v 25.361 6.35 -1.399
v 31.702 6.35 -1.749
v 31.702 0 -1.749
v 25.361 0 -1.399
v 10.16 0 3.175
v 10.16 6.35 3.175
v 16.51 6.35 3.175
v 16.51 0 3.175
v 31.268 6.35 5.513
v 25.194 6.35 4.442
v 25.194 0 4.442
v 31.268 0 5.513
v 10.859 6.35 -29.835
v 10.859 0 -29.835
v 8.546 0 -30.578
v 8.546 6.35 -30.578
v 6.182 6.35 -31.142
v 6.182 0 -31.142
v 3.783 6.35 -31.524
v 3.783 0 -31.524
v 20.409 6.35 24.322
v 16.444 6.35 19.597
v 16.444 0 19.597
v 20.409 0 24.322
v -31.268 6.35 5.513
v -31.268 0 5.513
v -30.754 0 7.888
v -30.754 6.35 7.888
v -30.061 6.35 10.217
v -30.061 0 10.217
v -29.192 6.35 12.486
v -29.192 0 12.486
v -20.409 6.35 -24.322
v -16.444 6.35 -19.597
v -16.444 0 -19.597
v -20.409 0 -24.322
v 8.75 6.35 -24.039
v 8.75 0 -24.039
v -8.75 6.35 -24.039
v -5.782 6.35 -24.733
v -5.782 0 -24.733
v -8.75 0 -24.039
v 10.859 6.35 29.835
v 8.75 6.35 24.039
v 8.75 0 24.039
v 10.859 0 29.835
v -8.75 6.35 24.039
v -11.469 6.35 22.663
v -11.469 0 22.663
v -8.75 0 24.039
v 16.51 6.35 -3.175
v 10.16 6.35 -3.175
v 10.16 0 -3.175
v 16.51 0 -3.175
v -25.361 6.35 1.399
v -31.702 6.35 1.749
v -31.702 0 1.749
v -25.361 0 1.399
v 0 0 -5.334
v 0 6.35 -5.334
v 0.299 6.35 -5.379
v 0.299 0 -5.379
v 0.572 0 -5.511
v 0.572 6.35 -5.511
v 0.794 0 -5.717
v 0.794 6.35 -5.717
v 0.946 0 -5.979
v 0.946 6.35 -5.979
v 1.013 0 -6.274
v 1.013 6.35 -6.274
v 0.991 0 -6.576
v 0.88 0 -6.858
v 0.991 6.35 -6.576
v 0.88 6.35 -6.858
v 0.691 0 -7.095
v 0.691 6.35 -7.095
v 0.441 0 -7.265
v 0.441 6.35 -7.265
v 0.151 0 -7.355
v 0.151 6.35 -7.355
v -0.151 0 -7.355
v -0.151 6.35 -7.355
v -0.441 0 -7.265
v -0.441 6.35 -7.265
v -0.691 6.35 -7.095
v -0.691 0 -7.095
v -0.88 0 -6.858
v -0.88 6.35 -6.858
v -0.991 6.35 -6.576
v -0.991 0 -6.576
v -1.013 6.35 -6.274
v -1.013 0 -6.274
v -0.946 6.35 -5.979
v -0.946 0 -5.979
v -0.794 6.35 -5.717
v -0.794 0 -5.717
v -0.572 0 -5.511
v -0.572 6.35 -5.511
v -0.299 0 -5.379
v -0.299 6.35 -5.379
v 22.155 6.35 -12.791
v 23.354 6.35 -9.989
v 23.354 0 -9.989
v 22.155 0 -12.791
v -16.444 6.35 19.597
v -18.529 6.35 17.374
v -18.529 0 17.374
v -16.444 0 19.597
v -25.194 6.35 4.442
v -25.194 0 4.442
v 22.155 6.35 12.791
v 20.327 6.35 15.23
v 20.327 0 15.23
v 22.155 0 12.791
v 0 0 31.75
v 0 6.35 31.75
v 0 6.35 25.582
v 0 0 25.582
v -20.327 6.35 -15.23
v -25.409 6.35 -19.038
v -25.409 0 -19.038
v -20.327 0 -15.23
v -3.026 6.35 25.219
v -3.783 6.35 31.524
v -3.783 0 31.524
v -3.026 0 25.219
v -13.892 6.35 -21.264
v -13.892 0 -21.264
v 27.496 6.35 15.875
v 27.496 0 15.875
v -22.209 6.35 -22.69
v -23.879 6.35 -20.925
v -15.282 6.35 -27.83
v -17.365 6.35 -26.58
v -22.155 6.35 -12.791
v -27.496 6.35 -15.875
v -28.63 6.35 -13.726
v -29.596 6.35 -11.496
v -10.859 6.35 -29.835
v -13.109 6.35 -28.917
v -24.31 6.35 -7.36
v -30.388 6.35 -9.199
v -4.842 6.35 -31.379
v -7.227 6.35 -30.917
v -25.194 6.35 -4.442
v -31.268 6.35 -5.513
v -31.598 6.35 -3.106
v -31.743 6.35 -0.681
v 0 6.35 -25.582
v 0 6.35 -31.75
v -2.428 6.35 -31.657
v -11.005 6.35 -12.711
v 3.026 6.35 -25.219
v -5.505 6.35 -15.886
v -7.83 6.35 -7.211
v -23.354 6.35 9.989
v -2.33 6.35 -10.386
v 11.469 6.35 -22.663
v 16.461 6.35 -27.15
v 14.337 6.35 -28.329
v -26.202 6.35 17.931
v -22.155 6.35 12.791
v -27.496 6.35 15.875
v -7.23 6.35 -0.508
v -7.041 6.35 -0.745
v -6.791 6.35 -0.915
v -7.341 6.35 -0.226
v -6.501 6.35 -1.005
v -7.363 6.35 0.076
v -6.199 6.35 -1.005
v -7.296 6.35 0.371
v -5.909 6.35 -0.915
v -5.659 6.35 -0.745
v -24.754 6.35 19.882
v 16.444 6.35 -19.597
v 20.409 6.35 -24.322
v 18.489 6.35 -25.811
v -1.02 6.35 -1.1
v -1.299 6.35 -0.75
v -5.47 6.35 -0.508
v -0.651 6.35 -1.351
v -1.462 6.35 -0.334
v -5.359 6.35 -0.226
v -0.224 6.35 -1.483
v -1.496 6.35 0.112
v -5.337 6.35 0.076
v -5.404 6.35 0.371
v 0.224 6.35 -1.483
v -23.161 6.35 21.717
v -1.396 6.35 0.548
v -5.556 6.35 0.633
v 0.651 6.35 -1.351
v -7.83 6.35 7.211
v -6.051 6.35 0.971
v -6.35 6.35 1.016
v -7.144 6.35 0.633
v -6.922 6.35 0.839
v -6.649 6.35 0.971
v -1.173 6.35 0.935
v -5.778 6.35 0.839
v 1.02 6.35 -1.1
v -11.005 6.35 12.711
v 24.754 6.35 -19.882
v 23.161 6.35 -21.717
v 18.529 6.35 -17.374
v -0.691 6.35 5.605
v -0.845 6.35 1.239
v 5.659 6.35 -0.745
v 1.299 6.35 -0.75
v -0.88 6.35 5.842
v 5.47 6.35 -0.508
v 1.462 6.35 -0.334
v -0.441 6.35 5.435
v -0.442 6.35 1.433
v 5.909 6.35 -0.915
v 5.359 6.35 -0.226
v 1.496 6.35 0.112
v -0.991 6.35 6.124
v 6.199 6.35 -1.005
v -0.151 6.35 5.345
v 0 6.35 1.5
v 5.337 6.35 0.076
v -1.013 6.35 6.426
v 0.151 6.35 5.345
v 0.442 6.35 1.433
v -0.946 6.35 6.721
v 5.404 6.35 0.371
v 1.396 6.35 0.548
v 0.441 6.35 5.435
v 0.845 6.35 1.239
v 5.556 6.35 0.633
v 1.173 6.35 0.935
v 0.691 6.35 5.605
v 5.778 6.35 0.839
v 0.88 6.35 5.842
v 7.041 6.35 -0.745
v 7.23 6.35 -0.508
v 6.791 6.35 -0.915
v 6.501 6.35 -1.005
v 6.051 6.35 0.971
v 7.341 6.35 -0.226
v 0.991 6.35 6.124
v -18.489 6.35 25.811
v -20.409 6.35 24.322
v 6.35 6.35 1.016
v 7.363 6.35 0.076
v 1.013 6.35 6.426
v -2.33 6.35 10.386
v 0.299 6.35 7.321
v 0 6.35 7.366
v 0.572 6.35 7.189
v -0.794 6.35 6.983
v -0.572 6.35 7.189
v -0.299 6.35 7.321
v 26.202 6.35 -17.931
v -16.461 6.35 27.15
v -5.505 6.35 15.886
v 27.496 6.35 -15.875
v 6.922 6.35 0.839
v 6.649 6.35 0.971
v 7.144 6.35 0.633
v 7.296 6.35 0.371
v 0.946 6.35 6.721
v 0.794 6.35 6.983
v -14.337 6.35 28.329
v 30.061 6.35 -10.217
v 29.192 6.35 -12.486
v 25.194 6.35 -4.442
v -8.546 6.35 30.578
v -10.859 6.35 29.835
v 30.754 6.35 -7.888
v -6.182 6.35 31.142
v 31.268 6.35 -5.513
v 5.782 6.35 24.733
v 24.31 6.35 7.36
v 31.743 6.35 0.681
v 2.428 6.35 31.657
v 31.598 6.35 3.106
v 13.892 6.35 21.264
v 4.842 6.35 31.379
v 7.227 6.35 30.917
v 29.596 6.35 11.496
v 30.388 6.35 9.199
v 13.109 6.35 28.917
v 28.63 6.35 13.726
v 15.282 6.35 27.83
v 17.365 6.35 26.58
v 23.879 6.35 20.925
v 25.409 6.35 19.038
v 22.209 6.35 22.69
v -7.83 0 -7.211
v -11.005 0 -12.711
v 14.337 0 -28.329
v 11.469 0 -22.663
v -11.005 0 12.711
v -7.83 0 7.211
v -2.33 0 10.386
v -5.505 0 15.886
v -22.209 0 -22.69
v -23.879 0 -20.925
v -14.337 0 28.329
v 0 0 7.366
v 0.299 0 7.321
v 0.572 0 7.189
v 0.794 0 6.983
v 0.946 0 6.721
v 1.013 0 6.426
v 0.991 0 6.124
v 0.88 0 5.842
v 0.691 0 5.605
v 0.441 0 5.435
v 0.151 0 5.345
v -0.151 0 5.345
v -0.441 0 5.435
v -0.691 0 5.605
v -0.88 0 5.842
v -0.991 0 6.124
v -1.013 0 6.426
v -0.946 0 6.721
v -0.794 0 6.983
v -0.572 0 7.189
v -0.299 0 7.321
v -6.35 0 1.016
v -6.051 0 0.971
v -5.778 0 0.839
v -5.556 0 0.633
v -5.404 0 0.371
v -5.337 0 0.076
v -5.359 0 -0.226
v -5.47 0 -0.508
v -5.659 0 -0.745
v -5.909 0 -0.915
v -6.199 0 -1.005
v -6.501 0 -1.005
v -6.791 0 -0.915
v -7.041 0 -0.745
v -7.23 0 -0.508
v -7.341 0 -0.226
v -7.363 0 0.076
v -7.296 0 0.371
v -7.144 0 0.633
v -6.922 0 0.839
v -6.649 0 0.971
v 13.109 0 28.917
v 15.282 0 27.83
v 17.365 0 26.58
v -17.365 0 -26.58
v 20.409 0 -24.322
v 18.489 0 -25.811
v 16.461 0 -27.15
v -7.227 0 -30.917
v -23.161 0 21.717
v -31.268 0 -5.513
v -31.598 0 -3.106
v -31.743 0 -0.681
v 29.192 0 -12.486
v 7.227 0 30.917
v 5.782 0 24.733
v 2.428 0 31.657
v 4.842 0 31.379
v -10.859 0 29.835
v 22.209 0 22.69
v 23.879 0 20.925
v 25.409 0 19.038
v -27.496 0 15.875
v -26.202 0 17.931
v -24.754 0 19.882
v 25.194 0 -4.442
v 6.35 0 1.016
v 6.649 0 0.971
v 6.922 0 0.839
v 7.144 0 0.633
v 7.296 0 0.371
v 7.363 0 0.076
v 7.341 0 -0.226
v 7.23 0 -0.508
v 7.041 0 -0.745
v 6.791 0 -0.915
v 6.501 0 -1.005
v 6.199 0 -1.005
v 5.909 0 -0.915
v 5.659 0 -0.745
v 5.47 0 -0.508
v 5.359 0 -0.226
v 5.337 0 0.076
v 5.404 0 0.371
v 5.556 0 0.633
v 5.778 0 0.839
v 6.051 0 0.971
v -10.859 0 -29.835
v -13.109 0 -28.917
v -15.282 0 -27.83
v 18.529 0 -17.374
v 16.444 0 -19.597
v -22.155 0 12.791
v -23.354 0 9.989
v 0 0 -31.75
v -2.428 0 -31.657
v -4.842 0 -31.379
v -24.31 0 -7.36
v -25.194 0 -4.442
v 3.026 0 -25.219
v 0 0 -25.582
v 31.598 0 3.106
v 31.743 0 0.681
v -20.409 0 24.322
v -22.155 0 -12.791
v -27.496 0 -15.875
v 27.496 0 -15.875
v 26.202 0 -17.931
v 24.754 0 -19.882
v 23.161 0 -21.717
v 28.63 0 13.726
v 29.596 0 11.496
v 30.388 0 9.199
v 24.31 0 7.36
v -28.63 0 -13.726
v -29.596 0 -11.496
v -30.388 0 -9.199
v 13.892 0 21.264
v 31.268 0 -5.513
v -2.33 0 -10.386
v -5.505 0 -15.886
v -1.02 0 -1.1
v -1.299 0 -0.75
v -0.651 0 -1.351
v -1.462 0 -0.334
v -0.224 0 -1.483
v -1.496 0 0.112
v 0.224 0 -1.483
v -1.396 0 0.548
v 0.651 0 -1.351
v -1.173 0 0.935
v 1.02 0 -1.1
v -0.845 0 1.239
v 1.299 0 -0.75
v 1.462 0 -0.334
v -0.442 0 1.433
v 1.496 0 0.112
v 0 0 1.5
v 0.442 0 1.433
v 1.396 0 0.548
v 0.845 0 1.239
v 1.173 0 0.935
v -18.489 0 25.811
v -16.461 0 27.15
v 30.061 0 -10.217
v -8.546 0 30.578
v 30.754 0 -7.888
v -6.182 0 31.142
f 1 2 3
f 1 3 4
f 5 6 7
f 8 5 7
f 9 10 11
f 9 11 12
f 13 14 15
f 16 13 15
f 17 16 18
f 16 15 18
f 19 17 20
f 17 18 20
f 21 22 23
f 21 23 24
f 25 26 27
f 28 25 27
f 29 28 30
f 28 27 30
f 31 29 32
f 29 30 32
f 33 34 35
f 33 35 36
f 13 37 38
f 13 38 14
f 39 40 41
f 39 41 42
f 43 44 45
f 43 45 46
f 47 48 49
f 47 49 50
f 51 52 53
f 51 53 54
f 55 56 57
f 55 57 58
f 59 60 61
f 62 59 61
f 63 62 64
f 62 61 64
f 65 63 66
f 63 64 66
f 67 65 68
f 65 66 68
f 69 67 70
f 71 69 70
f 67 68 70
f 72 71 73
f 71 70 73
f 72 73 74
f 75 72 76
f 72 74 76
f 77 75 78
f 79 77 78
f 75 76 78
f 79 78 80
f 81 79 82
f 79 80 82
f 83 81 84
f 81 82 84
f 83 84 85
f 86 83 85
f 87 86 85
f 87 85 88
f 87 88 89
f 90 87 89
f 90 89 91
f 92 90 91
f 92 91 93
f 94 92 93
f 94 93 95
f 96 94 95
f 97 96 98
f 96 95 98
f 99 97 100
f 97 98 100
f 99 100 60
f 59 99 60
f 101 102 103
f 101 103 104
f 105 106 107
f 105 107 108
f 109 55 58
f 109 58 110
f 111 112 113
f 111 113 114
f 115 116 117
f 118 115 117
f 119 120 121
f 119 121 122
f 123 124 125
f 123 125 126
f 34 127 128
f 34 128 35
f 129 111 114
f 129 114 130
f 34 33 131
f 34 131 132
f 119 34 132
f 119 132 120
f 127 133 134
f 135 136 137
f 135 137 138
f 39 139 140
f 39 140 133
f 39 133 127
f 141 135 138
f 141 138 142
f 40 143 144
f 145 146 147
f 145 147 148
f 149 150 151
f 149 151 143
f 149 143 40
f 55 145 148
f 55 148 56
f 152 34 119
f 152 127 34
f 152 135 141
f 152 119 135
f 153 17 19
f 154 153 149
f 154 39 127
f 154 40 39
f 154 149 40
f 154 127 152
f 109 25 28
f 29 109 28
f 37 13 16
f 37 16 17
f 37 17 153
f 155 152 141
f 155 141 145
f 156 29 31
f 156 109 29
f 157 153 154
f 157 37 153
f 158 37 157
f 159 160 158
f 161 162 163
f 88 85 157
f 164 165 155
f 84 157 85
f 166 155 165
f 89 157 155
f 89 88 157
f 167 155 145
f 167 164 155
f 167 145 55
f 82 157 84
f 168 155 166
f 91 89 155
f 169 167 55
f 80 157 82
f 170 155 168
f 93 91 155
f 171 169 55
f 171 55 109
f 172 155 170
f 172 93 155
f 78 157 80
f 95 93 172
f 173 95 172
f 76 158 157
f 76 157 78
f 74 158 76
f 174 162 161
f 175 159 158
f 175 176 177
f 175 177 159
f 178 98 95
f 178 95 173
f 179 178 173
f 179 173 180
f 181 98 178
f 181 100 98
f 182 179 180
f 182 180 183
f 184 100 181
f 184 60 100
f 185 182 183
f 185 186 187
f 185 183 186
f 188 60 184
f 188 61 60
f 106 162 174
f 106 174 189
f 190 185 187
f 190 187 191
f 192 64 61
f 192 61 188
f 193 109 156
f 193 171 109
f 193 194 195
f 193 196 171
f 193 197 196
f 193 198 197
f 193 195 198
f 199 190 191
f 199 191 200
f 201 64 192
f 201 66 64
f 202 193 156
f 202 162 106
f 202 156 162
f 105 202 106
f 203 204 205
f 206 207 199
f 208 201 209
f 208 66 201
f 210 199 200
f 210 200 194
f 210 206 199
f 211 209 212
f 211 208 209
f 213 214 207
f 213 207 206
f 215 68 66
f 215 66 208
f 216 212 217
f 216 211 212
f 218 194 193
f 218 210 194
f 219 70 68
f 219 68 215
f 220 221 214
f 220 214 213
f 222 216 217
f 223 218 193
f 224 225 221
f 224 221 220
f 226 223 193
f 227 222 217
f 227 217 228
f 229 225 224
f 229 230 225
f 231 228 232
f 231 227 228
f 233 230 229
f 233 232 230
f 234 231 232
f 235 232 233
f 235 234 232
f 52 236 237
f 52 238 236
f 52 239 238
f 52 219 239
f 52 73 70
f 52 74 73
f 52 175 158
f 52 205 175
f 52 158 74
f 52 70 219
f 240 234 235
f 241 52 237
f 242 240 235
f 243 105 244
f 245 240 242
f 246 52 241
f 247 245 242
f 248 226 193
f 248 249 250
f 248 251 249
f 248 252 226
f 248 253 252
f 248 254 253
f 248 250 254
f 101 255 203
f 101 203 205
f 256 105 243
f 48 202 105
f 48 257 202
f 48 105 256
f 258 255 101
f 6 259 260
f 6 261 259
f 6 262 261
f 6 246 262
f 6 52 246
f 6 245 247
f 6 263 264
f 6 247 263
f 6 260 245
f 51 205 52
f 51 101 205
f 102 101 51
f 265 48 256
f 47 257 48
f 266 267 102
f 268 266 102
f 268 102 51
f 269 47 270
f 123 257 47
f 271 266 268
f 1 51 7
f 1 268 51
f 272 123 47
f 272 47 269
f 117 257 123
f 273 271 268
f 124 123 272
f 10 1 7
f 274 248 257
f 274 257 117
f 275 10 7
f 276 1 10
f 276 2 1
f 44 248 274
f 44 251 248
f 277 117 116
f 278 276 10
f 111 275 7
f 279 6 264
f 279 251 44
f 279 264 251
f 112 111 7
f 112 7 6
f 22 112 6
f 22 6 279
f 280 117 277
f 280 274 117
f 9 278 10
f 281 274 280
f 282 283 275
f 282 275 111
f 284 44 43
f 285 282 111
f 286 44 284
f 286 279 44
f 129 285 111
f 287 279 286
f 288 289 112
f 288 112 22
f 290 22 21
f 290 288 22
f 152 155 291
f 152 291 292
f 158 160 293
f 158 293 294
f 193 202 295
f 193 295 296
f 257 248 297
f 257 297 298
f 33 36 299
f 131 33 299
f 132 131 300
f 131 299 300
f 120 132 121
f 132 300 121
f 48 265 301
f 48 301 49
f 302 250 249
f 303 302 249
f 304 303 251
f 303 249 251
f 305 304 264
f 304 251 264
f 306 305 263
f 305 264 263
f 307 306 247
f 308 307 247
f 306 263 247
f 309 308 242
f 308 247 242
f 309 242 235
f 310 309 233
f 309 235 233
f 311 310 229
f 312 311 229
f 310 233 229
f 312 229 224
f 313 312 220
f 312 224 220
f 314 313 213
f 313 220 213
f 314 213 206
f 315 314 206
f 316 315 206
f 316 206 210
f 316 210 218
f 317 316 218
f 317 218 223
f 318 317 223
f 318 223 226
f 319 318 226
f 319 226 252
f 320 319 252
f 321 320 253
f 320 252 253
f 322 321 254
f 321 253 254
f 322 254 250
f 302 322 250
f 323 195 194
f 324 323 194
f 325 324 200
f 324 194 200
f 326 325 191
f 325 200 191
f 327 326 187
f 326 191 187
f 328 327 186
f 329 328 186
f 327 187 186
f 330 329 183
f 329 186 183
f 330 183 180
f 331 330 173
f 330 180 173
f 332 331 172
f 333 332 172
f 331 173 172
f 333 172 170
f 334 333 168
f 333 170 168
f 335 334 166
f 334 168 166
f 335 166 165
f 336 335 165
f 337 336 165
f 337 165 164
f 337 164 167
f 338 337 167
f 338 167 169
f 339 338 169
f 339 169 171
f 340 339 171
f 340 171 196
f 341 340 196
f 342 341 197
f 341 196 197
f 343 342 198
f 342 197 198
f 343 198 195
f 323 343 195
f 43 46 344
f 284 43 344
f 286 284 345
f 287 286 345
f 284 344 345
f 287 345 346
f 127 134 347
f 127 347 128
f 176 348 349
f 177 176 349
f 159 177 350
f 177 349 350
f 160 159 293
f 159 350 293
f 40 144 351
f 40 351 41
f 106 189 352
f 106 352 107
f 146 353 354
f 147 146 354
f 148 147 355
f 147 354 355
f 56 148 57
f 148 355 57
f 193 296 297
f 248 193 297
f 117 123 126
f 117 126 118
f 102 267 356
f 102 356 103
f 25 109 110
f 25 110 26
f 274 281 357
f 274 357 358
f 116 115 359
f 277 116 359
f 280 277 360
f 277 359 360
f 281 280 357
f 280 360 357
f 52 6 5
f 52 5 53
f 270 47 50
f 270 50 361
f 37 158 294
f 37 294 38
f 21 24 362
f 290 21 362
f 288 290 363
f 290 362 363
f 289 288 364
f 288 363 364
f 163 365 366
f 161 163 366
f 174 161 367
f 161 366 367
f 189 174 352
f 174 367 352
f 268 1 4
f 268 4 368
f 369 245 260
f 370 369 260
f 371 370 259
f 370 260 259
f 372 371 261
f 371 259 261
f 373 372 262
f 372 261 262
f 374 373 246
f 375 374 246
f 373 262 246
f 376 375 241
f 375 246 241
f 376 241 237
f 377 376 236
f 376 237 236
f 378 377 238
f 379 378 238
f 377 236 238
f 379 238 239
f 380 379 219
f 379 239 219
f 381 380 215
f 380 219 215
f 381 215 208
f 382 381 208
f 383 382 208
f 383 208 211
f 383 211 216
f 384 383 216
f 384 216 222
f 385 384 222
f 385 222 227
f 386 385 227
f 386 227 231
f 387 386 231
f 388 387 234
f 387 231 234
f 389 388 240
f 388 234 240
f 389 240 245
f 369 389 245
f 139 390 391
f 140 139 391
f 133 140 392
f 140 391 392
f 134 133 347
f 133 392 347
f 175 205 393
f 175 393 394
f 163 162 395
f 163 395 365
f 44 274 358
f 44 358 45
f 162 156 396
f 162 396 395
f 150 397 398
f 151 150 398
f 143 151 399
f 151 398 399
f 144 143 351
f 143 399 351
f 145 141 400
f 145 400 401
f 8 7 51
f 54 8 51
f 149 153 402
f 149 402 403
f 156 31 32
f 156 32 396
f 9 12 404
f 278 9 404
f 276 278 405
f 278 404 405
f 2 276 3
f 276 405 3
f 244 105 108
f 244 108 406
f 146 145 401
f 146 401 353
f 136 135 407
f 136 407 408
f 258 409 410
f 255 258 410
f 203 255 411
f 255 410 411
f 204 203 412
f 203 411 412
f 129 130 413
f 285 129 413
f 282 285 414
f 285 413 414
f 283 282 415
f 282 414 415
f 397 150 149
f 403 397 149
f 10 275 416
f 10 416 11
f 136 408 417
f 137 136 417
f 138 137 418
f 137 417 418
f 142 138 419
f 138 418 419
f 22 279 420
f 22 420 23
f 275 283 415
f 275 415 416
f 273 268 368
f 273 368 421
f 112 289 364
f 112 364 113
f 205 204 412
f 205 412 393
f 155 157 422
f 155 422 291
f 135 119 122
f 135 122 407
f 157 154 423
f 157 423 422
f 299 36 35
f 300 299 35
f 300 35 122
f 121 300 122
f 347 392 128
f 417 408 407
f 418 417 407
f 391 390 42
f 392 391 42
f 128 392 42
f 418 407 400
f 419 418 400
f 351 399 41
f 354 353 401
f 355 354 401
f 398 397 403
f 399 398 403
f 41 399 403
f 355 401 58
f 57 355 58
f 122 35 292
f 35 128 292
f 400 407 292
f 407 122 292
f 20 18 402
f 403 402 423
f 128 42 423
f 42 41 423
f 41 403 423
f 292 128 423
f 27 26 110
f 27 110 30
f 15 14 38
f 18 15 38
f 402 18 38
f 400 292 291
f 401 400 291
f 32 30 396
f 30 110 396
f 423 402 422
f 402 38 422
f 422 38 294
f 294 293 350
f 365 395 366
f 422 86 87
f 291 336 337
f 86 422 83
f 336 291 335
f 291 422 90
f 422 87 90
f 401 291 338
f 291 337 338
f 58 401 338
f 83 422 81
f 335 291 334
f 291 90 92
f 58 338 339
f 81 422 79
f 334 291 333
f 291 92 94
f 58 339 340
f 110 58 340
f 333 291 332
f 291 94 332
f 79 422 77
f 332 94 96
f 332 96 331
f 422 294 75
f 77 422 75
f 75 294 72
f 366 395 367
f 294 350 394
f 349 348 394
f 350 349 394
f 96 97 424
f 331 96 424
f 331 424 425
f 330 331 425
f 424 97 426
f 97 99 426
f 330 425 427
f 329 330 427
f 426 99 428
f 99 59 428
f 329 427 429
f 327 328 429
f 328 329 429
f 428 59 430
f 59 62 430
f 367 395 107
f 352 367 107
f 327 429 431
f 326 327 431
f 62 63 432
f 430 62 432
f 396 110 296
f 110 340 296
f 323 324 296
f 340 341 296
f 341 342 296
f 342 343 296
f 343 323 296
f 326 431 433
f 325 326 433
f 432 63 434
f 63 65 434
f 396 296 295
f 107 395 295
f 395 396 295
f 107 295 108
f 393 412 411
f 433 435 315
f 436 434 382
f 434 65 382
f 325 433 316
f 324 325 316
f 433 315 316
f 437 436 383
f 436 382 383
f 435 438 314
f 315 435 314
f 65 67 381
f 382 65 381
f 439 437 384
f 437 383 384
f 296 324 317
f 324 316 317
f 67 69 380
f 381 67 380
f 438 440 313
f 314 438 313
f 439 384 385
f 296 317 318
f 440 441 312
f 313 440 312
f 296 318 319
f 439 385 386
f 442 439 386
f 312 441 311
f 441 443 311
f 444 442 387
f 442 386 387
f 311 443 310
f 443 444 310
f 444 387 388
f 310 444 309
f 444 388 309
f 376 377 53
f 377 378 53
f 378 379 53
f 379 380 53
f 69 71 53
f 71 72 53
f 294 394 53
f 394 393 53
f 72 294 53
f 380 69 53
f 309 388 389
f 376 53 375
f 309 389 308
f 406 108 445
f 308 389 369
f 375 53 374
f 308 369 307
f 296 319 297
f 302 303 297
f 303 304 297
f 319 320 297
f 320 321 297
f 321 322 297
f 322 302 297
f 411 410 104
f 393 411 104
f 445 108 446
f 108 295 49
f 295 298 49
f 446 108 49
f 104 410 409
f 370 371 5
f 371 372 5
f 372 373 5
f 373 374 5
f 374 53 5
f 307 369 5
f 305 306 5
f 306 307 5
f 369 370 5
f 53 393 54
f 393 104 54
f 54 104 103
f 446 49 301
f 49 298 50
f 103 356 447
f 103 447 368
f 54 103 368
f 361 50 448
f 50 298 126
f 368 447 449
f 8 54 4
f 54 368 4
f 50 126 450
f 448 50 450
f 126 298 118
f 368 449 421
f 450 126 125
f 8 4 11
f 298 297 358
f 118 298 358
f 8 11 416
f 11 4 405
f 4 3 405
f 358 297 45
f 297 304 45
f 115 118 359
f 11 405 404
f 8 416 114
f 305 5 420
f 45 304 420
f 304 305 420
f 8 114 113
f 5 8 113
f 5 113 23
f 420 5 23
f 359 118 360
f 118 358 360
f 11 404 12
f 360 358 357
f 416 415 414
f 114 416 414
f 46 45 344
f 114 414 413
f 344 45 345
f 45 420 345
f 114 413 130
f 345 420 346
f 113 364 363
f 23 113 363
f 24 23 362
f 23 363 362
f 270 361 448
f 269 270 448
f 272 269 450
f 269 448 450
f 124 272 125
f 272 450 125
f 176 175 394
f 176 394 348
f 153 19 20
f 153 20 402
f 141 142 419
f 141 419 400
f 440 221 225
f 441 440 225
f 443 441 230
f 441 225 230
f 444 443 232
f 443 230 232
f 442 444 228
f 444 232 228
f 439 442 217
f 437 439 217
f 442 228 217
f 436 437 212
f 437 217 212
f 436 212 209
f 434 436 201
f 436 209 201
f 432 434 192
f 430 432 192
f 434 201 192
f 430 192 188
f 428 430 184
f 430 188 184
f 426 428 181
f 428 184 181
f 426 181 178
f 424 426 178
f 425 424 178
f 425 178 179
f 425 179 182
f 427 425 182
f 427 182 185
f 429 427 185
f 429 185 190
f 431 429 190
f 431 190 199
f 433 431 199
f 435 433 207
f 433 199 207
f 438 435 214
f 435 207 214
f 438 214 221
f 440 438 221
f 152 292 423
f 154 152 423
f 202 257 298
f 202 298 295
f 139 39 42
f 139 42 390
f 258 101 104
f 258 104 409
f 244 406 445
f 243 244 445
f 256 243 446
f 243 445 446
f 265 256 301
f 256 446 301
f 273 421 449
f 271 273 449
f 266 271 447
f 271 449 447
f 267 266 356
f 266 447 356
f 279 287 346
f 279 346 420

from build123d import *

# Parameters (mm, degrees)
SKETCH1_R           = 31.75
BOSS_EXTRUDE1_DEPTH = 6.35
CUT_EXTRUDE1_DEPTH  = 6.35
SKETCH3_R           = 1.500000048
SKETCH3_W           = 6.35
SKETCH3_H           = 6.35
CUT_EXTRUDE2_DEPTH  = 6.35
SKETCH4_R           = 1.016
CUT_EXTRUDE3_DEPTH  = 6.35


with BuildPart() as part:
    # Sketch1 → Boss-Extrude1 (new body)
    with BuildSketch(Plane(origin=(0, 0, 0), x_dir=(1, 0, 0), z_dir=(0, 1, 0))):
        with Locations(Location((0, 0, 0), (0, 0, 270))):
            Circle(SKETCH1_R)
    extrude(amount=BOSS_EXTRUDE1_DEPTH)

    # Sketch2 → Cut-Extrude1 (cut)
    with BuildSketch(Plane(origin=(0, 6.35, 0), x_dir=(1, 0, 0), z_dir=(0, 1, 0))):
        Polygon((3.782860755, 31.523839622), (3.026288604, 25.219071698), (0, 25.58222633), (0, 31.75), (0, 34.308222633), (4.087660755, 34.063839622), align=None)
        Polygon((14.336514482, 28.328904894), (11.469211586, 22.663123915), (8.749636716, 24.039429306), (10.859139551, 29.83524071), (11.734103222, 32.239183641), (15.491663957, 30.611476411), align=None)
        Polygon((23.160972979, 21.717086146), (18.528778383, 17.373668917), (16.443938113, 19.597122323), (20.408506608, 24.321911069), (22.052900419, 26.281623301), (25.027143854, 23.466917368), align=None)
        Polygon((29.191876315, 12.485866298), (23.353501052, 9.988693039), (22.154857887, 12.791113165), (27.49630657, 15.875), (29.711792359, 17.154111317), (31.54398084, 13.491901755), align=None)
        Polygon((31.701808541, 1.748666704), (25.361446833, 1.398933363), (25.193574829, 4.442306983), (31.267646158, 5.513329641), (33.787003641, 5.957560339), (34.256148198, 1.889563672), align=None)
        Polygon((30.388034788, -9.199447903), (24.31042783, -7.359558323), (25.193574829, -4.442306983), (31.267646158, -5.513329641), (33.787003641, -5.957560339), (32.836518516, -9.940683678), align=None)
        Polygon((25.40901556, -19.037973323), (20.327212448, -15.230378659), (22.154857887, -12.791113165), (27.49630657, -15.875), (29.711792359, -17.154111317), (27.456320086, -20.571937867), align=None)
        Polygon((17.365294059, -26.58023819), (13.892235247, -21.264190552), (16.443938113, -19.597122323), (20.408506608, -24.321911069), (22.052900419, -26.281623301), (18.764484241, -28.721912739), align=None)
        Polygon((7.227061809, -30.916534049), (5.781649447, -24.733227239), (8.749636716, -24.039429306), (10.859139551, -29.83524071), (11.734103222, -32.239183641), (7.809374662, -33.407601046), align=None)
        Polygon((-3.782860755, -31.523839622), (-3.026288604, -25.219071698), (0, -25.58222633), (0, -31.75), (0, -34.308222633), (-4.087660755, -34.063839622), align=None)
        Polygon((-14.336514482, -28.328904894), (-11.469211586, -22.663123915), (-8.749636716, -24.039429306), (-10.859139551, -29.83524071), (-11.734103222, -32.239183641), (-15.491663957, -30.611476411), align=None)
        Polygon((-23.160972979, -21.717086146), (-18.528778383, -17.373668917), (-16.443938113, -19.597122323), (-20.408506608, -24.321911069), (-22.052900419, -26.281623301), (-25.027143854, -23.466917368), align=None)
        Polygon((-29.191876315, -12.485866298), (-23.353501052, -9.988693039), (-22.154857887, -12.791113165), (-27.49630657, -15.875), (-29.711792359, -17.154111317), (-31.54398084, -13.491901755), align=None)
        Polygon((-31.701808541, -1.748666704), (-25.361446833, -1.398933363), (-25.193574829, -4.442306983), (-31.267646158, -5.513329641), (-33.787003641, -5.957560339), (-34.256148198, -1.889563672), align=None)
        Polygon((-30.388034788, 9.199447903), (-24.31042783, 7.359558323), (-25.193574829, 4.442306983), (-31.267646158, 5.513329641), (-33.787003641, 5.957560339), (-32.836518516, 9.940683678), align=None)
        Polygon((-25.40901556, 19.037973323), (-20.327212448, 15.230378659), (-22.154857887, 12.791113165), (-27.49630657, 15.875), (-29.711792359, 17.154111317), (-27.456320086, 20.571937867), align=None)
        Polygon((-17.365294059, 26.58023819), (-13.892235247, 21.264190552), (-16.443938113, 19.597122323), (-20.408506608, 24.321911069), (-22.052900419, 26.281623301), (-18.764484241, 28.721912739), align=None)
        Polygon((-7.227061809, 30.916534049), (-5.781649447, 24.733227239), (-8.749636716, 24.039429306), (-10.859139551, 29.83524071), (-11.734103222, 32.239183641), (-7.809374662, 33.407601046), align=None)
    extrude(amount=-CUT_EXTRUDE1_DEPTH, mode=Mode.SUBTRACT)

    # Sketch3 → Cut-Extrude2 (cut)
    with BuildSketch(Plane(origin=(0, 6.35, 0), x_dir=(1, 0, 0), z_dir=(0, 1, 0))):
        with Locations(Location((0, 0, 0), (0, 0, 270))):
            Circle(SKETCH3_R)
        Polygon((-2.330369343, -10.386318102), (-5.505369343, -15.885579416), (-11.004630657, -12.710579416), (-7.829630657, -7.211318102), align=None)
        Polygon((-7.829630657, 7.211318102), (-11.004630657, 12.710579416), (-5.505369343, 15.885579416), (-2.330369343, 10.386318102), align=None)
        with Locations((13.335, 0)):
            Rectangle(SKETCH3_W, SKETCH3_H)
    extrude(amount=-CUT_EXTRUDE2_DEPTH, mode=Mode.SUBTRACT)

    # Sketch4 → Cut-Extrude3 (cut)
    with BuildSketch(Plane(origin=(0, 6.35, 0), x_dir=(1, 0, 0), z_dir=(0, 1, 0))):
        with Locations(Location((6.35, 0, 0), (0, 0, 270))):
            Circle(SKETCH4_R)
        with Locations(Location((0, -6.35, 0), (0, 0, 270))):
            Circle(SKETCH4_R)
        with Locations(Location((-6.35, 0, 0), (0, 0, 270))):
            Circle(SKETCH4_R)
        with Locations(Location((0, 6.35, 0), (0, 0, 270))):
            Circle(SKETCH4_R)
    extrude(amount=-CUT_EXTRUDE3_DEPTH, mode=Mode.SUBTRACT)


solid = part.part
